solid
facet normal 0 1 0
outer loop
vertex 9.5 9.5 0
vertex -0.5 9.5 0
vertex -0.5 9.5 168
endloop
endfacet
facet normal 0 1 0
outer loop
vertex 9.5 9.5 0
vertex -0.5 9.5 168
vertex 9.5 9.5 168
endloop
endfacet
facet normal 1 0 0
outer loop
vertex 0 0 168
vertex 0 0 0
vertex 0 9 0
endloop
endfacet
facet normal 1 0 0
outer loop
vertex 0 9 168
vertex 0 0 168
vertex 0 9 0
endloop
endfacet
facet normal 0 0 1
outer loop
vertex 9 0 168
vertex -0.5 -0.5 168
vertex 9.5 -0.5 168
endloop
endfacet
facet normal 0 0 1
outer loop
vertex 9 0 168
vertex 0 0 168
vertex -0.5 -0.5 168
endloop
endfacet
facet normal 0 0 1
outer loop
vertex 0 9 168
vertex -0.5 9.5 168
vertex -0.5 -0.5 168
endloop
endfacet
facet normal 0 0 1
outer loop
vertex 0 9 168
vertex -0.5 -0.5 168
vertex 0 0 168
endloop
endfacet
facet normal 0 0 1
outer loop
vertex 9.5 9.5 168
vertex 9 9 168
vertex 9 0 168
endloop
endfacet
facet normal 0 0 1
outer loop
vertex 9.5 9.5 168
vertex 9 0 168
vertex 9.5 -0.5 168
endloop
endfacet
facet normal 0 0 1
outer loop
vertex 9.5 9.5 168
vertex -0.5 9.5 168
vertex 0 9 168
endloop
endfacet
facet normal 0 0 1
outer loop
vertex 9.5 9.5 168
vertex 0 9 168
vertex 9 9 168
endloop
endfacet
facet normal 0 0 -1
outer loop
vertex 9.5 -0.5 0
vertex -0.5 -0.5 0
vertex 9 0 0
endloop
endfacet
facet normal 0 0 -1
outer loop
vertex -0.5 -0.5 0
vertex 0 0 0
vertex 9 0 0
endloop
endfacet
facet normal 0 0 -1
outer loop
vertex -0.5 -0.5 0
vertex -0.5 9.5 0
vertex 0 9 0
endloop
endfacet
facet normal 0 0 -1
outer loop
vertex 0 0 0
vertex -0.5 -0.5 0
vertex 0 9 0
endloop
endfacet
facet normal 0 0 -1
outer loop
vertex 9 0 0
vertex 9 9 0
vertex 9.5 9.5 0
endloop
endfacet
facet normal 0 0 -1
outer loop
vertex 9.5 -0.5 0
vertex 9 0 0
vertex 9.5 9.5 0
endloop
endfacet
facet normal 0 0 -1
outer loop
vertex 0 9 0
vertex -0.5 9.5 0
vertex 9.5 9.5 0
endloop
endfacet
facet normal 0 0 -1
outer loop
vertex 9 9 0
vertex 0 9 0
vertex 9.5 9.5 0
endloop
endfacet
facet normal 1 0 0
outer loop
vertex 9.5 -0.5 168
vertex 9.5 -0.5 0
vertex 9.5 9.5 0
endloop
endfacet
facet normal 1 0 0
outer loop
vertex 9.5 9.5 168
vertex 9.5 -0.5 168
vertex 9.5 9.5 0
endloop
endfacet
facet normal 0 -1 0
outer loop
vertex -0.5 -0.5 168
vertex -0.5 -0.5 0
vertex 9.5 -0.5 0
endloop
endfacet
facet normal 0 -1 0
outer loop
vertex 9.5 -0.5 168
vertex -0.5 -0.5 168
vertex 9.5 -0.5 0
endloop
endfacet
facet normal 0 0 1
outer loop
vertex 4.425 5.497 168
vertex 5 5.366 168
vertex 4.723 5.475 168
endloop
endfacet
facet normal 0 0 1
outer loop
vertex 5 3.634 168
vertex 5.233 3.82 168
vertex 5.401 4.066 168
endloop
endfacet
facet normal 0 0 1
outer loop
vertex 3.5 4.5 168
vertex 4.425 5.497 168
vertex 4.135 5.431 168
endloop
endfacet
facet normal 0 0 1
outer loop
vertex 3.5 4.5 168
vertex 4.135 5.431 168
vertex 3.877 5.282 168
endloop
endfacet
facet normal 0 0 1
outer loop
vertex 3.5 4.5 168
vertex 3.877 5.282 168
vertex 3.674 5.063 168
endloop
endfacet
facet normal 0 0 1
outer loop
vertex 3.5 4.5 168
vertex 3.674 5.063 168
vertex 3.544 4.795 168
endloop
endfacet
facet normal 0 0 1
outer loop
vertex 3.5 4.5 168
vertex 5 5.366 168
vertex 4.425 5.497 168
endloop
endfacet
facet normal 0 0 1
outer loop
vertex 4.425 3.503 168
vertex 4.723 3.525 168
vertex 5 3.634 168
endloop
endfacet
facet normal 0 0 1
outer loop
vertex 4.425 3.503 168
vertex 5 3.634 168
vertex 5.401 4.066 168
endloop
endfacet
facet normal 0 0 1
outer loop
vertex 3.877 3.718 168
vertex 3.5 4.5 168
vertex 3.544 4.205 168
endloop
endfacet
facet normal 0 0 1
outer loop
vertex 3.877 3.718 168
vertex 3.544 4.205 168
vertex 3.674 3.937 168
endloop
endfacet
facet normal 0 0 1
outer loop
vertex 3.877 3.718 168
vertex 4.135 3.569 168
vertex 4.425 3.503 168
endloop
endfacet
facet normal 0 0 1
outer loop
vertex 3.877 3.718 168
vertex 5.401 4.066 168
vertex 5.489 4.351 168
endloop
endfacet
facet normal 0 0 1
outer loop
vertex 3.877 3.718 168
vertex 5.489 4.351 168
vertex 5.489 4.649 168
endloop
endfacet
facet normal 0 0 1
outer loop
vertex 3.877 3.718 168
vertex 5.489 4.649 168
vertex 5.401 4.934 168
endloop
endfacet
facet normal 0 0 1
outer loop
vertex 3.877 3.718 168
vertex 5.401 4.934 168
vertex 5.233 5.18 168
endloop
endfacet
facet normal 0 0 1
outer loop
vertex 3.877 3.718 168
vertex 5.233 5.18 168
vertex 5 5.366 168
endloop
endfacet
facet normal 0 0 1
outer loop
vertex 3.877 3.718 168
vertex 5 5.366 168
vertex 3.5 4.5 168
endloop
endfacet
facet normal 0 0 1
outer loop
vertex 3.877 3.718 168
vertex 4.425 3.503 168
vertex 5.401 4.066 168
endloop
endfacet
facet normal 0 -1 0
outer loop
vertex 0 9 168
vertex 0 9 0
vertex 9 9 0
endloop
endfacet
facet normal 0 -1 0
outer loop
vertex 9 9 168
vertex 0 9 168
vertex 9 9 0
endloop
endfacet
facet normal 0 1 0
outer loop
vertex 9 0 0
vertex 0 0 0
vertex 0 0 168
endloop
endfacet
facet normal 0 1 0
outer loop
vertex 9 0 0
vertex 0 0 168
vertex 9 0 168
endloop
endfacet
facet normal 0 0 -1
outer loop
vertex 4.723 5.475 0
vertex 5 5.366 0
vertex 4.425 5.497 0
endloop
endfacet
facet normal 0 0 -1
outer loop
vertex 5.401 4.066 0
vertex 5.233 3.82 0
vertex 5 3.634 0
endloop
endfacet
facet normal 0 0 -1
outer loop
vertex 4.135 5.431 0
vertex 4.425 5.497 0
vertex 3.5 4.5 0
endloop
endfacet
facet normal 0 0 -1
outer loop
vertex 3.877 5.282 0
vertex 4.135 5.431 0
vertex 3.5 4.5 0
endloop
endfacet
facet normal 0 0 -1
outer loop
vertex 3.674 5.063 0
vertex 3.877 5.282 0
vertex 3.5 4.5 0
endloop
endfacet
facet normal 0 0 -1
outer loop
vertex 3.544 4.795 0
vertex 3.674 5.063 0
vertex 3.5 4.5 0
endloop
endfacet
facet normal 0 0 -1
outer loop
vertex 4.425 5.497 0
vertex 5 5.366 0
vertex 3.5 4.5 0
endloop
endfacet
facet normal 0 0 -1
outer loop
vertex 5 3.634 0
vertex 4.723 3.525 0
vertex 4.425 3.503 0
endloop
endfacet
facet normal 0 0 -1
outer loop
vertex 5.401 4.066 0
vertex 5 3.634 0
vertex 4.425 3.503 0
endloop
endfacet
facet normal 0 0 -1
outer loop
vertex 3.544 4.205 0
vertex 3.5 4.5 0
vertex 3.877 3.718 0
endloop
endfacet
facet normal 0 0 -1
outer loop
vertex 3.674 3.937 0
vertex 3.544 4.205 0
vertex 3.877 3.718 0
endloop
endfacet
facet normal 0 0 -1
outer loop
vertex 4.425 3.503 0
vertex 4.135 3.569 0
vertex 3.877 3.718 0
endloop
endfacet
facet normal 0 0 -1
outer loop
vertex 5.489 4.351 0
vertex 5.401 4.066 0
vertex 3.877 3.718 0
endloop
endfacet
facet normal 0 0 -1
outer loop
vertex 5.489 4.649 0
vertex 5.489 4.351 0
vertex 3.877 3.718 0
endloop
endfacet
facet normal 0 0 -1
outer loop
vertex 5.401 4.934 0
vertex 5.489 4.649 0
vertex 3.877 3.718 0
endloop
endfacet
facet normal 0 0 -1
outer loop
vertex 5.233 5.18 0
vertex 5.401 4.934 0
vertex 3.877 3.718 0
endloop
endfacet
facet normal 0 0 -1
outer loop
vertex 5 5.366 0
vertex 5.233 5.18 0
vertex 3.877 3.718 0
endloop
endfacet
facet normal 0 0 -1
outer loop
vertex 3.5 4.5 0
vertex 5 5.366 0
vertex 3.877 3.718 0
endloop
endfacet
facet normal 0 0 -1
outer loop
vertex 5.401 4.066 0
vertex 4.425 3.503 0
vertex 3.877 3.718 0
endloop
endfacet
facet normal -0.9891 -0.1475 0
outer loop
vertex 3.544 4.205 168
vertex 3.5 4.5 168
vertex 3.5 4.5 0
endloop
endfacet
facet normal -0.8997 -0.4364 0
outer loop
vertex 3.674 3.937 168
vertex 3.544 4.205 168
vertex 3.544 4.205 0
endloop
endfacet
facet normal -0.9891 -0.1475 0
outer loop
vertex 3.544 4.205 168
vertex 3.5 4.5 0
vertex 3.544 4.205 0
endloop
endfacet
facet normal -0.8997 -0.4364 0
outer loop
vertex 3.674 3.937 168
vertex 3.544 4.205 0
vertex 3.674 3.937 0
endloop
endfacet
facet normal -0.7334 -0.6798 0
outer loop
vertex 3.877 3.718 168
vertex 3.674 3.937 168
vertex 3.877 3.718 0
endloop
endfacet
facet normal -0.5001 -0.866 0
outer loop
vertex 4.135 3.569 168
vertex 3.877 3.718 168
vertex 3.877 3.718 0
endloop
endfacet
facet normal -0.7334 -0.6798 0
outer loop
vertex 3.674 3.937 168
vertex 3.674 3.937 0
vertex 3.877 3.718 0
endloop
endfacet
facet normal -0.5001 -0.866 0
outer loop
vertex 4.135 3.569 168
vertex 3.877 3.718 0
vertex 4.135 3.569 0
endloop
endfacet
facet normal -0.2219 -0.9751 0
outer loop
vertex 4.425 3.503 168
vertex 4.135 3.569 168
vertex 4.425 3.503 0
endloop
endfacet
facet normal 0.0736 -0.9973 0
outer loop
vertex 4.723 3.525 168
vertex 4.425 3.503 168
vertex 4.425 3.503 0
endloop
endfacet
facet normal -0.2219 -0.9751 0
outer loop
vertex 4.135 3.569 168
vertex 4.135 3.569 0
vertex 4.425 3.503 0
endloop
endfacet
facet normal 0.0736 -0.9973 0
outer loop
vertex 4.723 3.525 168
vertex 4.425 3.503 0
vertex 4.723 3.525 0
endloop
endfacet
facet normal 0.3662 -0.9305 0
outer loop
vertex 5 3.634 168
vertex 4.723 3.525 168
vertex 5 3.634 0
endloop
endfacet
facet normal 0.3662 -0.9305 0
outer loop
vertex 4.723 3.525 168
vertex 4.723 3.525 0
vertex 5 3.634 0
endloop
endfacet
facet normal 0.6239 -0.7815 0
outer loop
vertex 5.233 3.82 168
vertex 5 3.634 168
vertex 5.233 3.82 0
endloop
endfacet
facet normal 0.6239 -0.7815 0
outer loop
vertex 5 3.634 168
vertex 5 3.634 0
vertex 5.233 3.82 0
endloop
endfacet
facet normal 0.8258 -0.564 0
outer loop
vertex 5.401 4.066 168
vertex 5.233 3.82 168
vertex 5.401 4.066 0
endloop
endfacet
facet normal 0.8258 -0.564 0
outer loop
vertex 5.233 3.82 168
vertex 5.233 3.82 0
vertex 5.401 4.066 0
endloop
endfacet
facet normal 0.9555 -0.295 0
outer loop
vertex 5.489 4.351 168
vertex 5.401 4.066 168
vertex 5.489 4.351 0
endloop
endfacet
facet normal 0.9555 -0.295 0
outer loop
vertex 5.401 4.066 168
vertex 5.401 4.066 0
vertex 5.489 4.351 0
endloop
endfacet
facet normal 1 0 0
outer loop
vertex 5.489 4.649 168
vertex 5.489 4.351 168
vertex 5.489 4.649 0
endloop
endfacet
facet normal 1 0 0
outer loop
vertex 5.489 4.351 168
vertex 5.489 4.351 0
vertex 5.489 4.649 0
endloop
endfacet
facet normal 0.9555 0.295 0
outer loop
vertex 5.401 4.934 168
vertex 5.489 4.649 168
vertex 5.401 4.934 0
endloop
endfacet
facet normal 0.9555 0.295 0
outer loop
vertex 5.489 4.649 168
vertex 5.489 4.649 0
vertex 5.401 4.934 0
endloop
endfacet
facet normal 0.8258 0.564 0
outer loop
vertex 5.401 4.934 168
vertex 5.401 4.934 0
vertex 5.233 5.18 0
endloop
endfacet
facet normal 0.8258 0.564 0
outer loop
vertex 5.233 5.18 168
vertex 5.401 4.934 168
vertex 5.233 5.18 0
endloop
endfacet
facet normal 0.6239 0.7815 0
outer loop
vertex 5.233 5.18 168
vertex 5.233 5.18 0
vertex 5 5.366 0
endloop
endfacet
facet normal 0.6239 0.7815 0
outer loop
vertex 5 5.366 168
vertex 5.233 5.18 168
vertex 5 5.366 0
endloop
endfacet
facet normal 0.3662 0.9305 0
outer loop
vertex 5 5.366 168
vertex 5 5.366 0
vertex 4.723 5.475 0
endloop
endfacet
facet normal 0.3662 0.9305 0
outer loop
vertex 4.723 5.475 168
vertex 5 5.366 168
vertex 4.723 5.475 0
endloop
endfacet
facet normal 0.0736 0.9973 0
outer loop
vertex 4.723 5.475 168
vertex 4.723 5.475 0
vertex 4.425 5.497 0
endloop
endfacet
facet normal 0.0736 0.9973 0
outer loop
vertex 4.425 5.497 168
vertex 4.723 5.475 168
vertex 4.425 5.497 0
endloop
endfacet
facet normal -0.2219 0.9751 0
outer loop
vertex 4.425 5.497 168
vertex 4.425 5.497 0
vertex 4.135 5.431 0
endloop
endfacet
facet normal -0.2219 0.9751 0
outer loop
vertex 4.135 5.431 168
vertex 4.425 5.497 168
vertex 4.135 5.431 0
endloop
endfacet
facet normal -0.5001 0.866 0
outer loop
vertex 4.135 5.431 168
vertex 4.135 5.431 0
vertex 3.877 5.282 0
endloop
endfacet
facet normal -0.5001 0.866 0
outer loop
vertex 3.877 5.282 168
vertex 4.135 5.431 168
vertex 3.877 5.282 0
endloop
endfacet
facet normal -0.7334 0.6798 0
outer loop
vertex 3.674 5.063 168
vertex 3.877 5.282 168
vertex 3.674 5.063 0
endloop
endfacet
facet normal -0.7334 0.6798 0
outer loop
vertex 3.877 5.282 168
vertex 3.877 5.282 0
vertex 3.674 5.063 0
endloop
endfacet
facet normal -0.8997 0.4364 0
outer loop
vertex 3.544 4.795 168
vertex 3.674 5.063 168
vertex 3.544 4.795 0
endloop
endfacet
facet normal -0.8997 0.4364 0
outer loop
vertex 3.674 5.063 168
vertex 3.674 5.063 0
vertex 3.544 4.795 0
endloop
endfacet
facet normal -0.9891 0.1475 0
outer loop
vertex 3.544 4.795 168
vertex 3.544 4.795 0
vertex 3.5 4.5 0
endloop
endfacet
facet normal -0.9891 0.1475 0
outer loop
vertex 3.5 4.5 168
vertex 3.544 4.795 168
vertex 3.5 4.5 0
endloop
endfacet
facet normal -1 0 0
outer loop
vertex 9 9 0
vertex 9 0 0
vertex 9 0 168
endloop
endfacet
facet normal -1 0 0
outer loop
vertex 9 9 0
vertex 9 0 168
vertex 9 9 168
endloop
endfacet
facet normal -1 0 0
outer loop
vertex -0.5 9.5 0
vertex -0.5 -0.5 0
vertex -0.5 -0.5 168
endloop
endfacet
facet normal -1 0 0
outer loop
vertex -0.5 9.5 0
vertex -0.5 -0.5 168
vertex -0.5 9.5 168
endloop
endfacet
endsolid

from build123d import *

# Parameters (mm, degrees)
SKETCH1_W             = 10
SKETCH1_H             = 10
SKETCH1_W_2           = 9
SKETCH1_H_2           = 9
BOSS_EXTRUDE1_DEPTH   = 168
SKETCH1_R             = 1
BOSS_EXTRUDE1_2_DEPTH = 168


with BuildPart() as part:
    # Sketch1 → Boss-Extrude1 (new body)
    with BuildSketch(Plane.XY):
        with Locations((4.5, 4.5)):
            Rectangle(SKETCH1_W, SKETCH1_H)
        with Locations((4.5, 4.5)):
            Rectangle(SKETCH1_W_2, SKETCH1_H_2, mode=Mode.SUBTRACT)
    extrude(amount=BOSS_EXTRUDE1_DEPTH)


with BuildPart() as body_2:
    # Sketch1 → Boss-Extrude1 2 (new body)
    with BuildSketch(Plane.XY):
        with Locations(Location((4.5, 4.5, 0), (0, 0, 180))):
            Circle(SKETCH1_R)
    extrude(amount=BOSS_EXTRUDE1_2_DEPTH)


solid = Compound([part.part, body_2.part])
